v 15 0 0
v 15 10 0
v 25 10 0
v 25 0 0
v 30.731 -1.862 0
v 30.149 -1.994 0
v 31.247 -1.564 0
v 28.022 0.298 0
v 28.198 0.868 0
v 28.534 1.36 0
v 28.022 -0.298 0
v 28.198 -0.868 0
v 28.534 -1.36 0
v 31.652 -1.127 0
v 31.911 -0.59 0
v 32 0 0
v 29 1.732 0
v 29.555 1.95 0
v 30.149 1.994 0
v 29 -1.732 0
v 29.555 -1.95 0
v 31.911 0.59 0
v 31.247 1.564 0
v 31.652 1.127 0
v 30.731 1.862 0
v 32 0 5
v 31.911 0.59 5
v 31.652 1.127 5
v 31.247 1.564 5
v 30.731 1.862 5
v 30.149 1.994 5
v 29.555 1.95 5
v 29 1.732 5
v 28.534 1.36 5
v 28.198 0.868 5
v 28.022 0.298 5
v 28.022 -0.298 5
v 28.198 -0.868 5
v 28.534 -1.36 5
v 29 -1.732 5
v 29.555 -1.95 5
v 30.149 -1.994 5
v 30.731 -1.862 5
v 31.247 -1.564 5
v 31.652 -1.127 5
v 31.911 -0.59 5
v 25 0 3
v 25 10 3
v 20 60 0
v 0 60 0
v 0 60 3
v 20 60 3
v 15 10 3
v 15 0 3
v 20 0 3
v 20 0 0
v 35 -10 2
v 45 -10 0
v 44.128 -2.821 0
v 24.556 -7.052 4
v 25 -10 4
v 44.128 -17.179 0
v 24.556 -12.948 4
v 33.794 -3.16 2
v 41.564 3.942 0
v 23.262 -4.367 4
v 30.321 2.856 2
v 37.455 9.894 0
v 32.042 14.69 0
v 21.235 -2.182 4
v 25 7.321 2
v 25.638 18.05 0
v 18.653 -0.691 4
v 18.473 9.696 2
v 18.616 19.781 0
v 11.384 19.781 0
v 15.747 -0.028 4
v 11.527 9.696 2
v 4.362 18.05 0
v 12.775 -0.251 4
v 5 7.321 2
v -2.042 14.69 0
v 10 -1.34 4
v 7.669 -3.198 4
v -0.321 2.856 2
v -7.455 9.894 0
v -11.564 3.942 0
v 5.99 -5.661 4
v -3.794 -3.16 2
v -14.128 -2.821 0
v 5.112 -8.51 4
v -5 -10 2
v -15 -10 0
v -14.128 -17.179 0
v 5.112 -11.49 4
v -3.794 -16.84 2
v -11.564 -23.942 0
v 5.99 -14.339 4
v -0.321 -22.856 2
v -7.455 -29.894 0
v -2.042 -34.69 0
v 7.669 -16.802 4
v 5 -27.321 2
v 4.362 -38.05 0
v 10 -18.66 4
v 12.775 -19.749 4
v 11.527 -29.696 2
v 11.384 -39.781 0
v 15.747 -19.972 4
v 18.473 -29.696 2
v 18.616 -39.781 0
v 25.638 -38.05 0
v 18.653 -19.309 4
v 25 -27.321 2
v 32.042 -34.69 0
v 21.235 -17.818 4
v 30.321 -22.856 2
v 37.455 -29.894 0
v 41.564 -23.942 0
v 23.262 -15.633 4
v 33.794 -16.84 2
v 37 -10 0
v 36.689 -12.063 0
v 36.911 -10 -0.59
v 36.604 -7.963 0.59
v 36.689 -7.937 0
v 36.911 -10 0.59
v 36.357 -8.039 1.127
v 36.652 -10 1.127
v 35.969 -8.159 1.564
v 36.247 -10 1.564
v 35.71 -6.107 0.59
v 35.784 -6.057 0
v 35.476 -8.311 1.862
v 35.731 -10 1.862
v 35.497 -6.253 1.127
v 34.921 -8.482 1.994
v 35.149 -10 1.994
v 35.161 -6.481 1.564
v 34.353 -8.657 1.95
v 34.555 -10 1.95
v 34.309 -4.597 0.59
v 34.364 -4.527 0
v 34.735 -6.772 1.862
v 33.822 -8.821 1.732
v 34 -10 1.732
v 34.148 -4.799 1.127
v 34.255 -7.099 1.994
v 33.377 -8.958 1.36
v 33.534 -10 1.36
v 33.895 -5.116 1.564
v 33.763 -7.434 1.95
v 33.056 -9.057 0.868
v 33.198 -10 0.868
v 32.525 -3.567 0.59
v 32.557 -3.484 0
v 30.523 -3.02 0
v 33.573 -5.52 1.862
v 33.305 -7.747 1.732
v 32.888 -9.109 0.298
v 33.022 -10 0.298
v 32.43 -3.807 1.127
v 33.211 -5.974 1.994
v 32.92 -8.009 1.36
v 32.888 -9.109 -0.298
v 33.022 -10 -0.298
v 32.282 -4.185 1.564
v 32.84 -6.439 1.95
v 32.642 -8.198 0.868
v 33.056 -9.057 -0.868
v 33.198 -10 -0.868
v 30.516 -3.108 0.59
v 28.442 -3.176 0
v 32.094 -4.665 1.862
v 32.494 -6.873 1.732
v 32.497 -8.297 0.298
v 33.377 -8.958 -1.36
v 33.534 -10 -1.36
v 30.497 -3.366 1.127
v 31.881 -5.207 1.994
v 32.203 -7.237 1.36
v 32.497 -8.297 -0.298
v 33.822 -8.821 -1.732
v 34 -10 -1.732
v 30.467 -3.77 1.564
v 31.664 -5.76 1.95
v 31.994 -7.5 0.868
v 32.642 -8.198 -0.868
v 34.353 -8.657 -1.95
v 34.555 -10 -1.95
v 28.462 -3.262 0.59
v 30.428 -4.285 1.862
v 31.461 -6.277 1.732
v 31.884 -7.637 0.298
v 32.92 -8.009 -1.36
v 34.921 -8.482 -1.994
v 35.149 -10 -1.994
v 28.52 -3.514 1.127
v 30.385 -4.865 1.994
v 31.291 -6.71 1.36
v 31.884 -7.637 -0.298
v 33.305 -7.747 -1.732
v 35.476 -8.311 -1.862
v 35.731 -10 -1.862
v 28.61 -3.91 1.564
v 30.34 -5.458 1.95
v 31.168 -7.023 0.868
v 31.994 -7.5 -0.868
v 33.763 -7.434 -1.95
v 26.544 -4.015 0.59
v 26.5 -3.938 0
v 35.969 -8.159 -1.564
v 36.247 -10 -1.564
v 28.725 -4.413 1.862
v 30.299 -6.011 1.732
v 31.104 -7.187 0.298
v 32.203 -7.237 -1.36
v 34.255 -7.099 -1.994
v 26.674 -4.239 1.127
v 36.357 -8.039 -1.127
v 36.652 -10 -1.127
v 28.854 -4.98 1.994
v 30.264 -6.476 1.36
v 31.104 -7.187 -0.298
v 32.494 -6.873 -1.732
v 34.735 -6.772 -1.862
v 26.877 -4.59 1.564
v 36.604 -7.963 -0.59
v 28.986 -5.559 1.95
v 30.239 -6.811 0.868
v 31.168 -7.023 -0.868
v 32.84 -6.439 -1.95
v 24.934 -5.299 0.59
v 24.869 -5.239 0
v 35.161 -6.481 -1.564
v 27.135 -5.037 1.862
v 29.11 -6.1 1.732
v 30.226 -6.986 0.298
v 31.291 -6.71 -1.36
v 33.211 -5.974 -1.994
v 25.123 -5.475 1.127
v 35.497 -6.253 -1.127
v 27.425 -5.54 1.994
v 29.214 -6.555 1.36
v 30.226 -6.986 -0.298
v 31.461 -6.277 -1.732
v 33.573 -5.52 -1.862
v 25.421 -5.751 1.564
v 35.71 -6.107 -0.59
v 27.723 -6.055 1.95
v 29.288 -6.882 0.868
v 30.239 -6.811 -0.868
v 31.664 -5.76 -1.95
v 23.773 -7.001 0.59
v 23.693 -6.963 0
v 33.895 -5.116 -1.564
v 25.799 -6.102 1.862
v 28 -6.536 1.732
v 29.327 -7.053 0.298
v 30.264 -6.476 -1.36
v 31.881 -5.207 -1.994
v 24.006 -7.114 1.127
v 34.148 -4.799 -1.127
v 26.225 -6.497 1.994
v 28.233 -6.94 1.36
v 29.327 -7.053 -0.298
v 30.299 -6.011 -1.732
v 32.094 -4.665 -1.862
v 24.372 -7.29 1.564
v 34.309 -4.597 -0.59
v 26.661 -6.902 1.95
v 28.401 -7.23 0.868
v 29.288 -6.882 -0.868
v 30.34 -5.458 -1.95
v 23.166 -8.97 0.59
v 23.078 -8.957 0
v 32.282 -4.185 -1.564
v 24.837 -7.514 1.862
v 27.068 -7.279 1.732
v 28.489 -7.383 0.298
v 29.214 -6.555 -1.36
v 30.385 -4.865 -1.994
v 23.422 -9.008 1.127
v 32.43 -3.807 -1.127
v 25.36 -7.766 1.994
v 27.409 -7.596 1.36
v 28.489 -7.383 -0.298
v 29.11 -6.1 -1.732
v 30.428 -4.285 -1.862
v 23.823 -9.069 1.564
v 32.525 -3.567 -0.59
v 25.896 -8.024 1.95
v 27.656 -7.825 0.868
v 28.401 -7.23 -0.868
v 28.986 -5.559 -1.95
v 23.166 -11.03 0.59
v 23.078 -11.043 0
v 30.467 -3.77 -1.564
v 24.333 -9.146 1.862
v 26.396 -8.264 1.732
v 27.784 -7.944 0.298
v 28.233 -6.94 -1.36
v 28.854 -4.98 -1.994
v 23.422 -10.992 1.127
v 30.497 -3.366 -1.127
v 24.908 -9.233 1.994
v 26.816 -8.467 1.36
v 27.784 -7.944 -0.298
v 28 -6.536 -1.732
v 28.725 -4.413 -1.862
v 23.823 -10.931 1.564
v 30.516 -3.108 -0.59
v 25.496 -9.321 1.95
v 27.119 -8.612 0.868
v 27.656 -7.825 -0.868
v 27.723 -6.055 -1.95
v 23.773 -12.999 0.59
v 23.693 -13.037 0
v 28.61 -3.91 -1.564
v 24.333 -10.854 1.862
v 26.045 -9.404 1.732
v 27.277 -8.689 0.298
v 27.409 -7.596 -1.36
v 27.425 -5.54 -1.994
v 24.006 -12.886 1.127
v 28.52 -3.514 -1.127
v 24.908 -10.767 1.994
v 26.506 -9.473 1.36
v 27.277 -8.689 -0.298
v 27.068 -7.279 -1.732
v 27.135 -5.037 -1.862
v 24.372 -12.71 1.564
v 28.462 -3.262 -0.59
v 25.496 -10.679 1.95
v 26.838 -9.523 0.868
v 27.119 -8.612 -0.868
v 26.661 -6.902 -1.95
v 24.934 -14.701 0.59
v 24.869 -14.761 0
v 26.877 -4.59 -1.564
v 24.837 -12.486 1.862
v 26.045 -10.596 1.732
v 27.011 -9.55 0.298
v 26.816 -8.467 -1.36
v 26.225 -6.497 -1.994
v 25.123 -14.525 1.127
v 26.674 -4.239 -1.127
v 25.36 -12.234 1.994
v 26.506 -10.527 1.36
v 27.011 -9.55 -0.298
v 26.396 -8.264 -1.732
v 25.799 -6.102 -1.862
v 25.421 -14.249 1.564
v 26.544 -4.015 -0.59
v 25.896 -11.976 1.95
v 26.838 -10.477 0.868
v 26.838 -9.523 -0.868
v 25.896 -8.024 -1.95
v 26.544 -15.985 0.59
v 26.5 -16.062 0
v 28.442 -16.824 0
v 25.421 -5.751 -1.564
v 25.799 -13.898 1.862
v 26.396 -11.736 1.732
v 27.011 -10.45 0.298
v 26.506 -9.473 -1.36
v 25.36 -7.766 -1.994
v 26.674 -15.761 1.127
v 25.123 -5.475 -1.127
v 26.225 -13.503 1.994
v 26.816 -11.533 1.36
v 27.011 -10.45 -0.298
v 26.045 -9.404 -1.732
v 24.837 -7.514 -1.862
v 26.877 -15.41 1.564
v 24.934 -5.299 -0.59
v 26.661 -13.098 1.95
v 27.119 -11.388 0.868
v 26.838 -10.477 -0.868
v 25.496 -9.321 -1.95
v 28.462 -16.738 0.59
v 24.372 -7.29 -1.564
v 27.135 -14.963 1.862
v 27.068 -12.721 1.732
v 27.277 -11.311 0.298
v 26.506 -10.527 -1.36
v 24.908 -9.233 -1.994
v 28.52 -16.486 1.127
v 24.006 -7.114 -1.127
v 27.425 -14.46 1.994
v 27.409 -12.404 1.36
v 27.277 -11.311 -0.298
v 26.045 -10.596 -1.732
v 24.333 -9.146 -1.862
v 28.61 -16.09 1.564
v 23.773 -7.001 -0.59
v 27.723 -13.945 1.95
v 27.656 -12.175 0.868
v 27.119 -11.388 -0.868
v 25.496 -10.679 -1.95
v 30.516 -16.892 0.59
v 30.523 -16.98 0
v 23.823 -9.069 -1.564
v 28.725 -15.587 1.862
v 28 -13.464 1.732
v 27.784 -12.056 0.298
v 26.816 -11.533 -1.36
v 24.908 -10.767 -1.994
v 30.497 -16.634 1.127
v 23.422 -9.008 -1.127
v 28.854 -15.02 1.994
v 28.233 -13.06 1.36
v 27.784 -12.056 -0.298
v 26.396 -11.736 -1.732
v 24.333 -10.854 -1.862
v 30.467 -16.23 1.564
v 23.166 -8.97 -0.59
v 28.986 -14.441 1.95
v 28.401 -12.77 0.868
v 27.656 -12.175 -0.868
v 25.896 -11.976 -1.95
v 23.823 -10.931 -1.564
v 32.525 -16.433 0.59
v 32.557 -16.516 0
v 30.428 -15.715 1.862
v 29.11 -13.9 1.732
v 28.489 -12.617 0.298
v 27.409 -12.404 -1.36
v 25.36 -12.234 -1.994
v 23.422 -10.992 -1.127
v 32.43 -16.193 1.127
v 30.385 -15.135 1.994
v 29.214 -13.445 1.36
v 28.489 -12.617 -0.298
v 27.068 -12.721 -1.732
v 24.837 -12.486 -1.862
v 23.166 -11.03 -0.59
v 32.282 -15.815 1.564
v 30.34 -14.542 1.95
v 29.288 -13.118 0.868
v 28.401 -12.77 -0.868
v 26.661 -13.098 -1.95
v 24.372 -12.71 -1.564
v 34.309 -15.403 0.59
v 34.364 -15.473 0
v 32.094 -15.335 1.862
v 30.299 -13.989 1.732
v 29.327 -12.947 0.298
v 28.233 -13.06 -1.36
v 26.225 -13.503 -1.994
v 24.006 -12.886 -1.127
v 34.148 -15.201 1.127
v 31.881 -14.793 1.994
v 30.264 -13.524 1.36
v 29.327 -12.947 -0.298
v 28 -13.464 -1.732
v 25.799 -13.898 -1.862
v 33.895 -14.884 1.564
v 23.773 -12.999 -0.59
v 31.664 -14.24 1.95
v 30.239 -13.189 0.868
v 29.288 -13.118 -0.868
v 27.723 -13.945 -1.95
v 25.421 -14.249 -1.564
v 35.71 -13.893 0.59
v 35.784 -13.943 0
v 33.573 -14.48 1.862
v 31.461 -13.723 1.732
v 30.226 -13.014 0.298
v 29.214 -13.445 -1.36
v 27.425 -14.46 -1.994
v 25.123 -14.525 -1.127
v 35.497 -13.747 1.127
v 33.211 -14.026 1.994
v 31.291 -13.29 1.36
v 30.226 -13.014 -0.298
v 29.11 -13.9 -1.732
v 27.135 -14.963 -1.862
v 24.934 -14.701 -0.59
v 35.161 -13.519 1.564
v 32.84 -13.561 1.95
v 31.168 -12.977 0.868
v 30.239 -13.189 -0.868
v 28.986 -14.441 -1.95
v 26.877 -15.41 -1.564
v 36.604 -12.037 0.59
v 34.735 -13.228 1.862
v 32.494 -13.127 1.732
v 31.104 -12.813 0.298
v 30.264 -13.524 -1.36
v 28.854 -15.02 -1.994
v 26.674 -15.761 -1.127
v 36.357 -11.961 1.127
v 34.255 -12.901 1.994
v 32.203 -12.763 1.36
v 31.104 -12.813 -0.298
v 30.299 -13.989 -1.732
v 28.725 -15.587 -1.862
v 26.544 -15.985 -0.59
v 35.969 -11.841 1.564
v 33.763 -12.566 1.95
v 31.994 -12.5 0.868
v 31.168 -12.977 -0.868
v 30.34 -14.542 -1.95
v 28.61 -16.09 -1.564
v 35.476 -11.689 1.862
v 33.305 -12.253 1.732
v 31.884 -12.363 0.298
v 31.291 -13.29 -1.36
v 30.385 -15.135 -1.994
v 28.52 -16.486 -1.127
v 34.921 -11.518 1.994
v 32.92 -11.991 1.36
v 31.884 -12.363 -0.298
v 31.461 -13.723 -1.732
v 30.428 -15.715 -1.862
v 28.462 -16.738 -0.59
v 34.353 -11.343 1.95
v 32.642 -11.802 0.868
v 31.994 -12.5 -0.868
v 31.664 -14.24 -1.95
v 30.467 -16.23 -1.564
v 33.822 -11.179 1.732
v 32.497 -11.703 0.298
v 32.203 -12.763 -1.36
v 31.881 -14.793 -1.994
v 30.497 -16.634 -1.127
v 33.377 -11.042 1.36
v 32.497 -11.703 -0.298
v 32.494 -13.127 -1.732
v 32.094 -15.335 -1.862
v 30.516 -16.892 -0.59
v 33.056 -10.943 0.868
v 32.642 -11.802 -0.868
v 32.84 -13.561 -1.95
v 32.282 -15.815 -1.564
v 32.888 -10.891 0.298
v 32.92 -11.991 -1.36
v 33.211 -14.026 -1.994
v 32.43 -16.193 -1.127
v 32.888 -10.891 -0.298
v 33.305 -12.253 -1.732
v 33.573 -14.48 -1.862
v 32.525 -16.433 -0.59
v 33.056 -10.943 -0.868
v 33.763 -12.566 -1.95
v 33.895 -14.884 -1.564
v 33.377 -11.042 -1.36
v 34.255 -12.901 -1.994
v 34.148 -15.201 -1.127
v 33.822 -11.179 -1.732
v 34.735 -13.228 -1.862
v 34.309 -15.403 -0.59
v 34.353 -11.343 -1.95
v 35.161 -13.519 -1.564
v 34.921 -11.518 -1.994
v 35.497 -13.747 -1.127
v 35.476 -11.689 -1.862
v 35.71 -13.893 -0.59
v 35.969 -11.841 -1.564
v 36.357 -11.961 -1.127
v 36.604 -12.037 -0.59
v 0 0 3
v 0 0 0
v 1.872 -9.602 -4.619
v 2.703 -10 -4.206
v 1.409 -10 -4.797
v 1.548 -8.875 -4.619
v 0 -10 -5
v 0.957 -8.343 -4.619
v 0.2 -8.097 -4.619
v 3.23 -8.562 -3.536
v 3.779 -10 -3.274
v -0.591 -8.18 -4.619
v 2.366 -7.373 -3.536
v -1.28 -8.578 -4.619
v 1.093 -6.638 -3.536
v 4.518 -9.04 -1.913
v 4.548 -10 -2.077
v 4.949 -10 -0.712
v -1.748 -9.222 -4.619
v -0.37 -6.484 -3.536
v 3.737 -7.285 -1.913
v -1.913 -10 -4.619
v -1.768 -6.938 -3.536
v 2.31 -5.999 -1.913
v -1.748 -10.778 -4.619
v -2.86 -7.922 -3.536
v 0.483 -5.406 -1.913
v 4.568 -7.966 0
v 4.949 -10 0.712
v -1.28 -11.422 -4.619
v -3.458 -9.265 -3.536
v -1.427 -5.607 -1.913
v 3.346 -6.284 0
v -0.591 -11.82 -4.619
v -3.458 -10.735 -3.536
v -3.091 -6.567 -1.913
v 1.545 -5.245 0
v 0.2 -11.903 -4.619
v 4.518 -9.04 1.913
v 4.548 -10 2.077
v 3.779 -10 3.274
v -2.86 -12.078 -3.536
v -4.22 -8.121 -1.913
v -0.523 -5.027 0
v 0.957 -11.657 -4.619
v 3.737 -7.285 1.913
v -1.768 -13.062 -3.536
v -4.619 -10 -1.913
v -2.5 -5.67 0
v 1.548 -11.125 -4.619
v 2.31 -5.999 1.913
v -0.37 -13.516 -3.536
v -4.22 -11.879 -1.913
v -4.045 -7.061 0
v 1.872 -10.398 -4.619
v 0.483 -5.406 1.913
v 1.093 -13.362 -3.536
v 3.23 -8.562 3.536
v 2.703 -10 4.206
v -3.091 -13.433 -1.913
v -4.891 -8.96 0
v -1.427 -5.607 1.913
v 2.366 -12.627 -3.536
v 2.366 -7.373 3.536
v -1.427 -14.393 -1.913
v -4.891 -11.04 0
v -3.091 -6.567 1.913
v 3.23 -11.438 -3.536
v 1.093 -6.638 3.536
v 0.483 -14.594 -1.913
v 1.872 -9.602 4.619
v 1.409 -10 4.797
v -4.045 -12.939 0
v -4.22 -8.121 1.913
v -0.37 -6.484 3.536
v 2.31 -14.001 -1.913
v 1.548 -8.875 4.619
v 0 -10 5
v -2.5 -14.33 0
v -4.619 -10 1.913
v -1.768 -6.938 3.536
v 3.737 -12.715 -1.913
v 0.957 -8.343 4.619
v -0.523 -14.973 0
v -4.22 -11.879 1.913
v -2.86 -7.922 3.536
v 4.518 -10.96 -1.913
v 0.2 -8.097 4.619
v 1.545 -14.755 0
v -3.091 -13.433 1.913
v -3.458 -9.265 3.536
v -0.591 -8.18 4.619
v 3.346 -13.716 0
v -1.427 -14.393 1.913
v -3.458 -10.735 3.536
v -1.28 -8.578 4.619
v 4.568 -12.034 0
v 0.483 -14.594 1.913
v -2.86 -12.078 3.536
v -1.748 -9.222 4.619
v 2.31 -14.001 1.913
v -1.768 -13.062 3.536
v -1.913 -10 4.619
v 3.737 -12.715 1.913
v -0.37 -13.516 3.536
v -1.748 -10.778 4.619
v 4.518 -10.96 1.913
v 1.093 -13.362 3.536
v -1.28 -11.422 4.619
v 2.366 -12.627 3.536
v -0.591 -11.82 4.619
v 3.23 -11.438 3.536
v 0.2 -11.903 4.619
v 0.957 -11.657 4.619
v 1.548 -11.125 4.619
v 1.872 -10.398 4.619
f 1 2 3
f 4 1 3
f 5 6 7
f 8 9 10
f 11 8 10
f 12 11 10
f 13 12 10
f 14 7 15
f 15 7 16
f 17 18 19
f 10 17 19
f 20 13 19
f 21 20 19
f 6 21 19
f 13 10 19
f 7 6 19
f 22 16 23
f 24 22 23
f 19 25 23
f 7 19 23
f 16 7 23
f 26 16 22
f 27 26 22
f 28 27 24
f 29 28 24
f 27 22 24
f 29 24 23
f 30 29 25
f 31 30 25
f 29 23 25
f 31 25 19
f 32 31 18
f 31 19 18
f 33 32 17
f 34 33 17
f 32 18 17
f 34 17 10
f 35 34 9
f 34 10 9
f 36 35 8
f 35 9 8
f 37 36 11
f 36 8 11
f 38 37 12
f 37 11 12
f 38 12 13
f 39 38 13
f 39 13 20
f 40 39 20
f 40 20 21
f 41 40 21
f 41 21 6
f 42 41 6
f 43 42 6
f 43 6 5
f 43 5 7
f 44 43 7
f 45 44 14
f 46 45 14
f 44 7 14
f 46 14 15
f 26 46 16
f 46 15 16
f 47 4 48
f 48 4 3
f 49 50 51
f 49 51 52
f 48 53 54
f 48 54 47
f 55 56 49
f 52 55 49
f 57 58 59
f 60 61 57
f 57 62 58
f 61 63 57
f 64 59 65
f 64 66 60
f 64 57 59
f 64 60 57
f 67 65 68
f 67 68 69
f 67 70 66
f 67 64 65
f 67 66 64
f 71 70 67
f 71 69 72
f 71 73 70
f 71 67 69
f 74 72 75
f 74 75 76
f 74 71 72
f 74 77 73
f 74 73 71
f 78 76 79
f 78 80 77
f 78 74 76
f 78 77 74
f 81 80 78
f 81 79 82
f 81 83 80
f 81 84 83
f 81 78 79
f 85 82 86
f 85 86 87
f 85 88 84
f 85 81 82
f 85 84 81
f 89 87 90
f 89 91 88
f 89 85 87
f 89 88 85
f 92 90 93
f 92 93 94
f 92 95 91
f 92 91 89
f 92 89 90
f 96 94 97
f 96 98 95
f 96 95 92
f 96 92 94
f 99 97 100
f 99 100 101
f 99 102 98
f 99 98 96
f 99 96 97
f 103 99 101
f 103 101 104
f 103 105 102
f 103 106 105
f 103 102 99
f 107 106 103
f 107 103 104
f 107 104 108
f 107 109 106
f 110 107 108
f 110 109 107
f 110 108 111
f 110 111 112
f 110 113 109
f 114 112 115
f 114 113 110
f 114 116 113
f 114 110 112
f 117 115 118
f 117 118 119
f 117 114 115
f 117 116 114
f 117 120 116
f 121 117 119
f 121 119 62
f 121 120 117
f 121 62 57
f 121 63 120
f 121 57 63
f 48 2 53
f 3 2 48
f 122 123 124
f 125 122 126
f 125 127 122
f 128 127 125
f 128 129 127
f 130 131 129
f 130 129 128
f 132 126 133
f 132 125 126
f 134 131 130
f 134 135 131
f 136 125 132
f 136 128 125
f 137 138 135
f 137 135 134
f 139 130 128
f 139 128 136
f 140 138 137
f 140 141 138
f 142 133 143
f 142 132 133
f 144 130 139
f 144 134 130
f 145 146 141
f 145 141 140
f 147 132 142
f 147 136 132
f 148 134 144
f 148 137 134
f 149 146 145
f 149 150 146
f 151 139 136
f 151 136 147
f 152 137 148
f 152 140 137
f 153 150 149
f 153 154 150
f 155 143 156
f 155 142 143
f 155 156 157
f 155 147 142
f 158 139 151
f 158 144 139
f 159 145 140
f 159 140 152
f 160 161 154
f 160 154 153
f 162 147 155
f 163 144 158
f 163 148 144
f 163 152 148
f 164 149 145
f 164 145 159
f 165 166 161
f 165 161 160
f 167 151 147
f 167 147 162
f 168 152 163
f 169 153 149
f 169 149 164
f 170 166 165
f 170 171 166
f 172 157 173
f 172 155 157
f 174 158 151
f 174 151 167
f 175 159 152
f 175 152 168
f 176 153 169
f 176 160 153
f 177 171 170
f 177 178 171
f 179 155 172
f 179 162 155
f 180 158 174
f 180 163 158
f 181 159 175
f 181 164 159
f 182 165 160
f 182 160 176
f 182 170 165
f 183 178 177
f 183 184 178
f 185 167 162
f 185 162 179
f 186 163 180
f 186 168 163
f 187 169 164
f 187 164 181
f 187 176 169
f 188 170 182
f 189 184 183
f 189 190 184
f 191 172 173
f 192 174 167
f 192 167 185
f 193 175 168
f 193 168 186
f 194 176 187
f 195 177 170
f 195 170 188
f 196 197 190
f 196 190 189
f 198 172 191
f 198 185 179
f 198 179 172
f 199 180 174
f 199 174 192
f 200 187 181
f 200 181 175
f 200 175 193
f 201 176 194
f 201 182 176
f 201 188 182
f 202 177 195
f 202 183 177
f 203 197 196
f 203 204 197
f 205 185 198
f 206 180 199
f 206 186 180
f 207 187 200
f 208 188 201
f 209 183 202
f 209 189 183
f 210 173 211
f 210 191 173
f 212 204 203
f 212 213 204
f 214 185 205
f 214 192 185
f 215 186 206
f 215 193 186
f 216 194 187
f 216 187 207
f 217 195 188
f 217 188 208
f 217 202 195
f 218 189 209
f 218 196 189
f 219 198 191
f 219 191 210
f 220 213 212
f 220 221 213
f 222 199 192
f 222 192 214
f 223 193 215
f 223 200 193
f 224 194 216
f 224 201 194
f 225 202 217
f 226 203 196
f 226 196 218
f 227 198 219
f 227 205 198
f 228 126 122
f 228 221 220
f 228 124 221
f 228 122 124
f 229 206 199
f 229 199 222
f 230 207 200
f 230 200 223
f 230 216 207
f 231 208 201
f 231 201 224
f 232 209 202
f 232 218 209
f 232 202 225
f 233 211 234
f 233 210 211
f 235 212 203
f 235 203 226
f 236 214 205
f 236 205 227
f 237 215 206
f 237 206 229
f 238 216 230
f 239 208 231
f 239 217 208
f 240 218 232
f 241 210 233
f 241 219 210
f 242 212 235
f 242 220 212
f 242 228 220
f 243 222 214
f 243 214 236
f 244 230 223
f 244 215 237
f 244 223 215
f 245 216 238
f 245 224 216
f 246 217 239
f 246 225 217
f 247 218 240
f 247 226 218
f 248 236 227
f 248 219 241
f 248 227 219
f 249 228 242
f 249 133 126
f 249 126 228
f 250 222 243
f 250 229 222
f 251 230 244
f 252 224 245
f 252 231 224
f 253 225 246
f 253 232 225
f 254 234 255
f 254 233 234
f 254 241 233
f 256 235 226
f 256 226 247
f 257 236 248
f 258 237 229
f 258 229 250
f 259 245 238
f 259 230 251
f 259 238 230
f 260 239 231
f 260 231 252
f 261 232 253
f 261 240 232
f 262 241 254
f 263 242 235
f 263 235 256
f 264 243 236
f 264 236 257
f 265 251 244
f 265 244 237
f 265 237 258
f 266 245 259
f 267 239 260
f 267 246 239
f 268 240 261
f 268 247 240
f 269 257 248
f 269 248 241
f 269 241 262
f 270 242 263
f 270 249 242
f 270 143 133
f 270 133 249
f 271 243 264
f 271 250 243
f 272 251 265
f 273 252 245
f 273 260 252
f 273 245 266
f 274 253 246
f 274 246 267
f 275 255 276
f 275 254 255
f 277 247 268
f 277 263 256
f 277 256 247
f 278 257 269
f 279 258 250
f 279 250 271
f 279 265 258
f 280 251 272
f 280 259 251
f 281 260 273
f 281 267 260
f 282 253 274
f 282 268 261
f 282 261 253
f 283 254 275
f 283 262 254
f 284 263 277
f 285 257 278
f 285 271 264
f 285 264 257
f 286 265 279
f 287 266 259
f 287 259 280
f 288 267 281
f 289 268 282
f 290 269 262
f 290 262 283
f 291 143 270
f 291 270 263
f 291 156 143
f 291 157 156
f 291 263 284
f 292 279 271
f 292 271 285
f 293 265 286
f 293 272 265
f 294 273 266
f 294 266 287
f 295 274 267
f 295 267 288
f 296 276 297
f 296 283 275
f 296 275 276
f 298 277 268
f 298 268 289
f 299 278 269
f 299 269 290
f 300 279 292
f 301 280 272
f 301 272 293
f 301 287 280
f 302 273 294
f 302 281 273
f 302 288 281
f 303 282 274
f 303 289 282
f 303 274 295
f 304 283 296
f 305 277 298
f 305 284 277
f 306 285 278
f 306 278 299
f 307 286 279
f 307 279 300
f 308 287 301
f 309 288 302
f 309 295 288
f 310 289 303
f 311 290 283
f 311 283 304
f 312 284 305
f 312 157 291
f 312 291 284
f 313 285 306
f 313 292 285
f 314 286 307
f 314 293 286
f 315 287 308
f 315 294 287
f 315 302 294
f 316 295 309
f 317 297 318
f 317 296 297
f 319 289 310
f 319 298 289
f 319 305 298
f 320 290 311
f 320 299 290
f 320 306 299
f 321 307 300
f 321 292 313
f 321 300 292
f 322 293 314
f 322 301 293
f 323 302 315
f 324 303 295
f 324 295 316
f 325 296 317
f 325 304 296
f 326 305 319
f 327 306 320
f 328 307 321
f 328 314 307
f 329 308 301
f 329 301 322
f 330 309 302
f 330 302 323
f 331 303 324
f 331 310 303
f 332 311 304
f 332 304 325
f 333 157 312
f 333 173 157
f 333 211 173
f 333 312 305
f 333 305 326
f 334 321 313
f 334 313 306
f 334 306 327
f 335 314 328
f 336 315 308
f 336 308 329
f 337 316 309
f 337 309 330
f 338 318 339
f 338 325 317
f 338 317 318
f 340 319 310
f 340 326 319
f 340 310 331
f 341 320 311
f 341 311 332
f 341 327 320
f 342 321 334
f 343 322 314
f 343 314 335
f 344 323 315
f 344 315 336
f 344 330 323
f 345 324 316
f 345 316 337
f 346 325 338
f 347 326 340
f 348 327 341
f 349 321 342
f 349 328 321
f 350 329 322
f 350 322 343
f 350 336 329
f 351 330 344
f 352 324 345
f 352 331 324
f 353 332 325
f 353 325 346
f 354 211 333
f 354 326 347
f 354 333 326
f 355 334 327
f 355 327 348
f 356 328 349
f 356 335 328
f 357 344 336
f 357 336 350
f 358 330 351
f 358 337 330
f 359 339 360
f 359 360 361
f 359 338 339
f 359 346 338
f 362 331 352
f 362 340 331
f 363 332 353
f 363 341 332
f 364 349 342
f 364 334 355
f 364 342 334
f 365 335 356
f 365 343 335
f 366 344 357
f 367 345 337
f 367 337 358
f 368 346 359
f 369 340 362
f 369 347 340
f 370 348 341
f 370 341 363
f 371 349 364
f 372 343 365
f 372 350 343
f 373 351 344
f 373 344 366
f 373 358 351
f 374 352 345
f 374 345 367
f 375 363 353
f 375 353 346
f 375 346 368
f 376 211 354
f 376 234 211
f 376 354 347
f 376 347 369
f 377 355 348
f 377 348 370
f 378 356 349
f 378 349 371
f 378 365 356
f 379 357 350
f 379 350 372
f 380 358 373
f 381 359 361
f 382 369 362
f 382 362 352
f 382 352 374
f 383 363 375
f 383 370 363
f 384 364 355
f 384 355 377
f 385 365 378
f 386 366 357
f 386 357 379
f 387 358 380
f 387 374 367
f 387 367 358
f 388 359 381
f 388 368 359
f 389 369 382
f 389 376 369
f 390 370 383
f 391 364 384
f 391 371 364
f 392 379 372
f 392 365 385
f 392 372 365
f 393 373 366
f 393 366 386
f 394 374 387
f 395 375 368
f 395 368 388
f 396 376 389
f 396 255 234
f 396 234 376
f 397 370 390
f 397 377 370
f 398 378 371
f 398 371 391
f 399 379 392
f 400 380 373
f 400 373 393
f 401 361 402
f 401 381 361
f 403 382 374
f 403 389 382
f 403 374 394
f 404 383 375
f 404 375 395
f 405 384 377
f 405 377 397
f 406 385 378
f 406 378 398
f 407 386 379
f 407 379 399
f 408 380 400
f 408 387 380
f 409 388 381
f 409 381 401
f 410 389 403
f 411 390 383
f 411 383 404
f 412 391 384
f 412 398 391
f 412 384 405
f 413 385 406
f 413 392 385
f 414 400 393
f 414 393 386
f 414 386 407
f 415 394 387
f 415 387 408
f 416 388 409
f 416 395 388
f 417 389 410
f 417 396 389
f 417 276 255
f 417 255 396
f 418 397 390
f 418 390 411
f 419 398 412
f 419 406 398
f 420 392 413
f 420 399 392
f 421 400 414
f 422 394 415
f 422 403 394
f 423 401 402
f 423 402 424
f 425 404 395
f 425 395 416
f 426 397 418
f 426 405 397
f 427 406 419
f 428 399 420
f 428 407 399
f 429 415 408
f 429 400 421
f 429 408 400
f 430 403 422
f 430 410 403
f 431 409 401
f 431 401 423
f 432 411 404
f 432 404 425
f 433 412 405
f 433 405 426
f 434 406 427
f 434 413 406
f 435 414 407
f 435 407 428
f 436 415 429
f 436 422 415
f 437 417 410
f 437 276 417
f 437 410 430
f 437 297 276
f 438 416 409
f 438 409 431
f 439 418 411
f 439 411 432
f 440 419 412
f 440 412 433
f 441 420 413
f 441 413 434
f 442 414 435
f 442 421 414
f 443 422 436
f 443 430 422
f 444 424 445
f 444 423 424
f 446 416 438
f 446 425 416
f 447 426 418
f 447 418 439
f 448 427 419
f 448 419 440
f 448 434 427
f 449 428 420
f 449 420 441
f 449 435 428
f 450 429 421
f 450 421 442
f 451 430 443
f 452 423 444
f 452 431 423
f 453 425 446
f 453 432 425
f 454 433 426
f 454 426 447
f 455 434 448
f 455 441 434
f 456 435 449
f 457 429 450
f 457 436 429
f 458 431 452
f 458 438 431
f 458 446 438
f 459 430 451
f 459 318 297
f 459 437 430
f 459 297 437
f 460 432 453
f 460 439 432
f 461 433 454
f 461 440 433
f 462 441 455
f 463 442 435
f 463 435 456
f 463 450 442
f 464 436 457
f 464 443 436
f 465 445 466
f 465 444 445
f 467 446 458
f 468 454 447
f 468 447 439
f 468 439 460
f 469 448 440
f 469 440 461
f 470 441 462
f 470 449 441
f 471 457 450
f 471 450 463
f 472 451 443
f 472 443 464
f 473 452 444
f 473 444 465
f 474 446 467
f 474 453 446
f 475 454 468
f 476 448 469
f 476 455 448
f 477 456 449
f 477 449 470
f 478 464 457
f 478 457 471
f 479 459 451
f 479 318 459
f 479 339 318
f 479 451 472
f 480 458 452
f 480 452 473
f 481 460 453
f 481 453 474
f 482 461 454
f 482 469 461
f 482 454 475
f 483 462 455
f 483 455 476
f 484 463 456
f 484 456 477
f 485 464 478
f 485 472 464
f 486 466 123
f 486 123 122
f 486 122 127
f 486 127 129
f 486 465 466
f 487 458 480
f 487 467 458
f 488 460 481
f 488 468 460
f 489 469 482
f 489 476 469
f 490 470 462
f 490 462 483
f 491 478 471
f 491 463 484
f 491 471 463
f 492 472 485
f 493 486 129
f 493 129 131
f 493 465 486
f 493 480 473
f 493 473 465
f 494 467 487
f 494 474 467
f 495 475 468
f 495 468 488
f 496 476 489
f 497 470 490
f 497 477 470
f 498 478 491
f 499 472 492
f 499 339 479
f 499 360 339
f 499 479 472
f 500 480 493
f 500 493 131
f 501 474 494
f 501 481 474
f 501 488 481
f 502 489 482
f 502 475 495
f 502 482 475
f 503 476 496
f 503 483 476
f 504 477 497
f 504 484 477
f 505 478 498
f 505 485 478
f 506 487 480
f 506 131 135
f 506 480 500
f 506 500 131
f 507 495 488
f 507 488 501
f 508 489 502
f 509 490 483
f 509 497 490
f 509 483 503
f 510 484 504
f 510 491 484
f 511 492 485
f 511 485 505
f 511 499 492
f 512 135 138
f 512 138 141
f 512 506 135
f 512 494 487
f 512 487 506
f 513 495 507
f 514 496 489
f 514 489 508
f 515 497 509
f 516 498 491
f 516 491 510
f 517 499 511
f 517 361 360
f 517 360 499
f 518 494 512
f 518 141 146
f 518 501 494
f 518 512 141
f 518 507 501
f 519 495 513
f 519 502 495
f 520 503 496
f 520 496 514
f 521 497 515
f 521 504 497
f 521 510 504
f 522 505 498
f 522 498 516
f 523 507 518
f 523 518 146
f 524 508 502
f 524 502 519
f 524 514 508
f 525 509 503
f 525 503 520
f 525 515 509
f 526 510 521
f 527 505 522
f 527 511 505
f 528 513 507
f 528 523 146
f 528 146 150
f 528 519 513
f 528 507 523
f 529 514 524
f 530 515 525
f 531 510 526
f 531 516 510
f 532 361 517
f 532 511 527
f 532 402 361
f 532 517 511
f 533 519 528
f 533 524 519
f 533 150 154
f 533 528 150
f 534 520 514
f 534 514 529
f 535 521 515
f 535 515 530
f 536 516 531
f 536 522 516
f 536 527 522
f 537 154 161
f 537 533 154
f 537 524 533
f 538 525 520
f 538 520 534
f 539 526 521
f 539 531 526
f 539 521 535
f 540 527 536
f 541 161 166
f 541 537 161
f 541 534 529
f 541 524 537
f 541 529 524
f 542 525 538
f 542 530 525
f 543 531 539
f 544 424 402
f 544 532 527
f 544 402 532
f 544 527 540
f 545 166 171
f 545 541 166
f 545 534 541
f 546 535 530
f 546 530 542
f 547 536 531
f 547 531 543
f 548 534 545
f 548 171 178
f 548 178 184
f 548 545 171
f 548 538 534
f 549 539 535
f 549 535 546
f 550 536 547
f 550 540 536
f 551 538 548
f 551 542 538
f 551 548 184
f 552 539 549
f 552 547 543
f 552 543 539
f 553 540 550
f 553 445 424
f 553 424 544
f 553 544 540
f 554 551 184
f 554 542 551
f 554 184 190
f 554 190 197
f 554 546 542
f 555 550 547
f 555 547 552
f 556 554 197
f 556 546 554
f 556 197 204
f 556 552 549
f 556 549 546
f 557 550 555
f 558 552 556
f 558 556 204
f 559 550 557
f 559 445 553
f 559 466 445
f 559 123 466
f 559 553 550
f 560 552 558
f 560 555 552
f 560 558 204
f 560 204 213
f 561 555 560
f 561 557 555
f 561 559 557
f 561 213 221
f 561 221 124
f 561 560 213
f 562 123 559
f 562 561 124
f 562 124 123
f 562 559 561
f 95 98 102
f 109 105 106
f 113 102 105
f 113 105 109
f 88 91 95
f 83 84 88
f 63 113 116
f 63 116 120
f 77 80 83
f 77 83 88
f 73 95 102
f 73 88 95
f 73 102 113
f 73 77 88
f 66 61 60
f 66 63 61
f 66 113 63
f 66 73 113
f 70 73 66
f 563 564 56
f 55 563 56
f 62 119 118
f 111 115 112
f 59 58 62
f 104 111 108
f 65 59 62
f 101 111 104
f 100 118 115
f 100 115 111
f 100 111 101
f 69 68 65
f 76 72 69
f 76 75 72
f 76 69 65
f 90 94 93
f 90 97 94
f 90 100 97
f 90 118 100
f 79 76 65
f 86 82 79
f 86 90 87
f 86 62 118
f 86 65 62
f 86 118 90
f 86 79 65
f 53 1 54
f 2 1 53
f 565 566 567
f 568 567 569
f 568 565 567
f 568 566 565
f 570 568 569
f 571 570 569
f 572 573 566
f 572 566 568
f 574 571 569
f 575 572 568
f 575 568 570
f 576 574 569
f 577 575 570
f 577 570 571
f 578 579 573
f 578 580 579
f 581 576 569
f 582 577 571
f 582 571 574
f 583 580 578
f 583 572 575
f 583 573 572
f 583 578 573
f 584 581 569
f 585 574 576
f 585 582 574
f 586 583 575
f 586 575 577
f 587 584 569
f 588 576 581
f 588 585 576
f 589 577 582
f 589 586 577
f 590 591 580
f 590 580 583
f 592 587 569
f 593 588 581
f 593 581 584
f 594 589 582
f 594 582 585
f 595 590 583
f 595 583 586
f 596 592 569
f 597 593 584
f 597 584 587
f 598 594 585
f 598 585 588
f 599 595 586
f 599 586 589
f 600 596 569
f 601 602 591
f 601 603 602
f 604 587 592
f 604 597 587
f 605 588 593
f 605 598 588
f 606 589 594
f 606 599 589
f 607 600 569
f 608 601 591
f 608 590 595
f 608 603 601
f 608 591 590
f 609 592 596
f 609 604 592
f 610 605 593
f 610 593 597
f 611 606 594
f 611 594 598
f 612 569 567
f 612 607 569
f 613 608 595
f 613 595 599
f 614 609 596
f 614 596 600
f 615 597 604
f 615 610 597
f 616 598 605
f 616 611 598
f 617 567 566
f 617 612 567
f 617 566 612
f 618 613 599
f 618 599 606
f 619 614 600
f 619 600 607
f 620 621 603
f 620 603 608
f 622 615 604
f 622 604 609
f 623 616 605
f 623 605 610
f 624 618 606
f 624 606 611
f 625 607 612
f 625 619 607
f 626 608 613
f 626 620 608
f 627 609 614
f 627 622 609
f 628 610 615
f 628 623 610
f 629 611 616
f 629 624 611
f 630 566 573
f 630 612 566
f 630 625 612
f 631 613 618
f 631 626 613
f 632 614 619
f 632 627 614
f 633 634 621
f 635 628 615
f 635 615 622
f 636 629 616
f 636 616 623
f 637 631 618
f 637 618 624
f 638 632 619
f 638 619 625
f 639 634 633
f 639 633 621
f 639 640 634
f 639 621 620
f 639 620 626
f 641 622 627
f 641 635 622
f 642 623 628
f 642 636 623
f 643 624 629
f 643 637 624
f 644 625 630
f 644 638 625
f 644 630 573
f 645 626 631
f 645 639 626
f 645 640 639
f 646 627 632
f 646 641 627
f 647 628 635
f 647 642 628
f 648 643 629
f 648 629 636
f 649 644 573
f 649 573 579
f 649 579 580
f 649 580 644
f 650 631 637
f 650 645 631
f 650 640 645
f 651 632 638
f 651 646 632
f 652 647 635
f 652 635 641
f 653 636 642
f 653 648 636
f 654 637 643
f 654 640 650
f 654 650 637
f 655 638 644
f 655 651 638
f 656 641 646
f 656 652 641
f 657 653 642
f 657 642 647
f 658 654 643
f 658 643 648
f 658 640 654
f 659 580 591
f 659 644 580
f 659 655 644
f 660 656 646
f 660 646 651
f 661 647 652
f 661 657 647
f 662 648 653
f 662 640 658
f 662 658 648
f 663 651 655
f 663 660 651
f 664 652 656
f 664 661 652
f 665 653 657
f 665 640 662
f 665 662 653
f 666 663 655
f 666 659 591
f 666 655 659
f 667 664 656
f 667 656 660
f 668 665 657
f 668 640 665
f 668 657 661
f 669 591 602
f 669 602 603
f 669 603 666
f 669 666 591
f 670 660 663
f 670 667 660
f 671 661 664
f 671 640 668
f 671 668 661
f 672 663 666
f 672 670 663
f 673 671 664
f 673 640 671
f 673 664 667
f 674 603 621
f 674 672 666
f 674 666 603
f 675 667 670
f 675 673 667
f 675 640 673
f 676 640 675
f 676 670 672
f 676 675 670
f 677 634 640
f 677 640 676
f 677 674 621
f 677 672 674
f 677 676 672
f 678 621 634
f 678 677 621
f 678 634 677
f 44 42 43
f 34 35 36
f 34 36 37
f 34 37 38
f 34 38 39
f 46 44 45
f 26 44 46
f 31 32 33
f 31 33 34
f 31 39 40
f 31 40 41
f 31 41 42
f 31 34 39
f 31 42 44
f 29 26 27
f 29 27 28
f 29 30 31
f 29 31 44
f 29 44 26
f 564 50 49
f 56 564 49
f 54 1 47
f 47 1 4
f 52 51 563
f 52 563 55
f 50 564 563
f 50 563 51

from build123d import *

# Parameters (mm, degrees)
BOX_W          = 10
BOX_H          = 10
BOX_DEPTH      = 3
BOX001_W       = 20
BOX001_H       = 60
BOX001_DEPTH   = 3
CYLINDER_R     = 2
CYLINDER_DEPTH = 5
TORUS_R        = 2


with BuildPart() as cube:
    # Box → Box (new body)
    with BuildSketch(Plane(origin=(15, 0, 0), x_dir=(1, 0, 0), z_dir=(0, 0, 1))):
        with Locations((5, 5)):
            Rectangle(BOX_W, BOX_H)
    extrude(amount=BOX_DEPTH)


with BuildPart() as cube001:
    # Box001 → Box001 (new body)
    with BuildSketch(Plane.XY):
        with Locations((10, 30)):
            Rectangle(BOX001_W, BOX001_H)
    extrude(amount=BOX001_DEPTH)


with BuildPart() as cylinder:
    # Cylinder → Cylinder (new body)
    with BuildSketch(Plane(origin=(30, 0, 0), x_dir=(1, 0, 0), z_dir=(0, 0, 1))):
        Circle(CYLINDER_R)
    extrude(amount=CYLINDER_DEPTH)


with BuildPart() as sphere:
    # Sphere → Sphere (revolve)
    with BuildSketch(Plane.XZ.offset(10)):
        with BuildLine():
            ThreePointArc((0, -5), (5, 0), (0, 5))
            Line((0, 5), (0, -5))
        make_face()
    revolve(axis=Axis((0, -10, 0), (0, 0, 1)))


with BuildPart() as cone:
    # Cone → Cone (revolve)
    with BuildSketch(Plane(origin=(15, -10, 0), x_dir=(1, 0, 0), z_dir=(0, -1, 0))):
        Polygon((0, 0), (30, 0), (10, 4), (0, 4), align=None)
    revolve(axis=Axis((15, -10, 0), (0, 0, 1)))


with BuildPart() as torus:
    # Torus → Torus (revolve)
    with BuildSketch(Plane(origin=(30, -10, 0), x_dir=(1, 0, 0), z_dir=(0, -1, 0))):
        with Locations((5, 0)):
            Circle(TORUS_R)
    revolve(axis=Axis((30, -10, 0), (0, 0, 1)))


solid = Compound([cube.part, cube001.part, cylinder.part, sphere.part, cone.part, torus.part])
